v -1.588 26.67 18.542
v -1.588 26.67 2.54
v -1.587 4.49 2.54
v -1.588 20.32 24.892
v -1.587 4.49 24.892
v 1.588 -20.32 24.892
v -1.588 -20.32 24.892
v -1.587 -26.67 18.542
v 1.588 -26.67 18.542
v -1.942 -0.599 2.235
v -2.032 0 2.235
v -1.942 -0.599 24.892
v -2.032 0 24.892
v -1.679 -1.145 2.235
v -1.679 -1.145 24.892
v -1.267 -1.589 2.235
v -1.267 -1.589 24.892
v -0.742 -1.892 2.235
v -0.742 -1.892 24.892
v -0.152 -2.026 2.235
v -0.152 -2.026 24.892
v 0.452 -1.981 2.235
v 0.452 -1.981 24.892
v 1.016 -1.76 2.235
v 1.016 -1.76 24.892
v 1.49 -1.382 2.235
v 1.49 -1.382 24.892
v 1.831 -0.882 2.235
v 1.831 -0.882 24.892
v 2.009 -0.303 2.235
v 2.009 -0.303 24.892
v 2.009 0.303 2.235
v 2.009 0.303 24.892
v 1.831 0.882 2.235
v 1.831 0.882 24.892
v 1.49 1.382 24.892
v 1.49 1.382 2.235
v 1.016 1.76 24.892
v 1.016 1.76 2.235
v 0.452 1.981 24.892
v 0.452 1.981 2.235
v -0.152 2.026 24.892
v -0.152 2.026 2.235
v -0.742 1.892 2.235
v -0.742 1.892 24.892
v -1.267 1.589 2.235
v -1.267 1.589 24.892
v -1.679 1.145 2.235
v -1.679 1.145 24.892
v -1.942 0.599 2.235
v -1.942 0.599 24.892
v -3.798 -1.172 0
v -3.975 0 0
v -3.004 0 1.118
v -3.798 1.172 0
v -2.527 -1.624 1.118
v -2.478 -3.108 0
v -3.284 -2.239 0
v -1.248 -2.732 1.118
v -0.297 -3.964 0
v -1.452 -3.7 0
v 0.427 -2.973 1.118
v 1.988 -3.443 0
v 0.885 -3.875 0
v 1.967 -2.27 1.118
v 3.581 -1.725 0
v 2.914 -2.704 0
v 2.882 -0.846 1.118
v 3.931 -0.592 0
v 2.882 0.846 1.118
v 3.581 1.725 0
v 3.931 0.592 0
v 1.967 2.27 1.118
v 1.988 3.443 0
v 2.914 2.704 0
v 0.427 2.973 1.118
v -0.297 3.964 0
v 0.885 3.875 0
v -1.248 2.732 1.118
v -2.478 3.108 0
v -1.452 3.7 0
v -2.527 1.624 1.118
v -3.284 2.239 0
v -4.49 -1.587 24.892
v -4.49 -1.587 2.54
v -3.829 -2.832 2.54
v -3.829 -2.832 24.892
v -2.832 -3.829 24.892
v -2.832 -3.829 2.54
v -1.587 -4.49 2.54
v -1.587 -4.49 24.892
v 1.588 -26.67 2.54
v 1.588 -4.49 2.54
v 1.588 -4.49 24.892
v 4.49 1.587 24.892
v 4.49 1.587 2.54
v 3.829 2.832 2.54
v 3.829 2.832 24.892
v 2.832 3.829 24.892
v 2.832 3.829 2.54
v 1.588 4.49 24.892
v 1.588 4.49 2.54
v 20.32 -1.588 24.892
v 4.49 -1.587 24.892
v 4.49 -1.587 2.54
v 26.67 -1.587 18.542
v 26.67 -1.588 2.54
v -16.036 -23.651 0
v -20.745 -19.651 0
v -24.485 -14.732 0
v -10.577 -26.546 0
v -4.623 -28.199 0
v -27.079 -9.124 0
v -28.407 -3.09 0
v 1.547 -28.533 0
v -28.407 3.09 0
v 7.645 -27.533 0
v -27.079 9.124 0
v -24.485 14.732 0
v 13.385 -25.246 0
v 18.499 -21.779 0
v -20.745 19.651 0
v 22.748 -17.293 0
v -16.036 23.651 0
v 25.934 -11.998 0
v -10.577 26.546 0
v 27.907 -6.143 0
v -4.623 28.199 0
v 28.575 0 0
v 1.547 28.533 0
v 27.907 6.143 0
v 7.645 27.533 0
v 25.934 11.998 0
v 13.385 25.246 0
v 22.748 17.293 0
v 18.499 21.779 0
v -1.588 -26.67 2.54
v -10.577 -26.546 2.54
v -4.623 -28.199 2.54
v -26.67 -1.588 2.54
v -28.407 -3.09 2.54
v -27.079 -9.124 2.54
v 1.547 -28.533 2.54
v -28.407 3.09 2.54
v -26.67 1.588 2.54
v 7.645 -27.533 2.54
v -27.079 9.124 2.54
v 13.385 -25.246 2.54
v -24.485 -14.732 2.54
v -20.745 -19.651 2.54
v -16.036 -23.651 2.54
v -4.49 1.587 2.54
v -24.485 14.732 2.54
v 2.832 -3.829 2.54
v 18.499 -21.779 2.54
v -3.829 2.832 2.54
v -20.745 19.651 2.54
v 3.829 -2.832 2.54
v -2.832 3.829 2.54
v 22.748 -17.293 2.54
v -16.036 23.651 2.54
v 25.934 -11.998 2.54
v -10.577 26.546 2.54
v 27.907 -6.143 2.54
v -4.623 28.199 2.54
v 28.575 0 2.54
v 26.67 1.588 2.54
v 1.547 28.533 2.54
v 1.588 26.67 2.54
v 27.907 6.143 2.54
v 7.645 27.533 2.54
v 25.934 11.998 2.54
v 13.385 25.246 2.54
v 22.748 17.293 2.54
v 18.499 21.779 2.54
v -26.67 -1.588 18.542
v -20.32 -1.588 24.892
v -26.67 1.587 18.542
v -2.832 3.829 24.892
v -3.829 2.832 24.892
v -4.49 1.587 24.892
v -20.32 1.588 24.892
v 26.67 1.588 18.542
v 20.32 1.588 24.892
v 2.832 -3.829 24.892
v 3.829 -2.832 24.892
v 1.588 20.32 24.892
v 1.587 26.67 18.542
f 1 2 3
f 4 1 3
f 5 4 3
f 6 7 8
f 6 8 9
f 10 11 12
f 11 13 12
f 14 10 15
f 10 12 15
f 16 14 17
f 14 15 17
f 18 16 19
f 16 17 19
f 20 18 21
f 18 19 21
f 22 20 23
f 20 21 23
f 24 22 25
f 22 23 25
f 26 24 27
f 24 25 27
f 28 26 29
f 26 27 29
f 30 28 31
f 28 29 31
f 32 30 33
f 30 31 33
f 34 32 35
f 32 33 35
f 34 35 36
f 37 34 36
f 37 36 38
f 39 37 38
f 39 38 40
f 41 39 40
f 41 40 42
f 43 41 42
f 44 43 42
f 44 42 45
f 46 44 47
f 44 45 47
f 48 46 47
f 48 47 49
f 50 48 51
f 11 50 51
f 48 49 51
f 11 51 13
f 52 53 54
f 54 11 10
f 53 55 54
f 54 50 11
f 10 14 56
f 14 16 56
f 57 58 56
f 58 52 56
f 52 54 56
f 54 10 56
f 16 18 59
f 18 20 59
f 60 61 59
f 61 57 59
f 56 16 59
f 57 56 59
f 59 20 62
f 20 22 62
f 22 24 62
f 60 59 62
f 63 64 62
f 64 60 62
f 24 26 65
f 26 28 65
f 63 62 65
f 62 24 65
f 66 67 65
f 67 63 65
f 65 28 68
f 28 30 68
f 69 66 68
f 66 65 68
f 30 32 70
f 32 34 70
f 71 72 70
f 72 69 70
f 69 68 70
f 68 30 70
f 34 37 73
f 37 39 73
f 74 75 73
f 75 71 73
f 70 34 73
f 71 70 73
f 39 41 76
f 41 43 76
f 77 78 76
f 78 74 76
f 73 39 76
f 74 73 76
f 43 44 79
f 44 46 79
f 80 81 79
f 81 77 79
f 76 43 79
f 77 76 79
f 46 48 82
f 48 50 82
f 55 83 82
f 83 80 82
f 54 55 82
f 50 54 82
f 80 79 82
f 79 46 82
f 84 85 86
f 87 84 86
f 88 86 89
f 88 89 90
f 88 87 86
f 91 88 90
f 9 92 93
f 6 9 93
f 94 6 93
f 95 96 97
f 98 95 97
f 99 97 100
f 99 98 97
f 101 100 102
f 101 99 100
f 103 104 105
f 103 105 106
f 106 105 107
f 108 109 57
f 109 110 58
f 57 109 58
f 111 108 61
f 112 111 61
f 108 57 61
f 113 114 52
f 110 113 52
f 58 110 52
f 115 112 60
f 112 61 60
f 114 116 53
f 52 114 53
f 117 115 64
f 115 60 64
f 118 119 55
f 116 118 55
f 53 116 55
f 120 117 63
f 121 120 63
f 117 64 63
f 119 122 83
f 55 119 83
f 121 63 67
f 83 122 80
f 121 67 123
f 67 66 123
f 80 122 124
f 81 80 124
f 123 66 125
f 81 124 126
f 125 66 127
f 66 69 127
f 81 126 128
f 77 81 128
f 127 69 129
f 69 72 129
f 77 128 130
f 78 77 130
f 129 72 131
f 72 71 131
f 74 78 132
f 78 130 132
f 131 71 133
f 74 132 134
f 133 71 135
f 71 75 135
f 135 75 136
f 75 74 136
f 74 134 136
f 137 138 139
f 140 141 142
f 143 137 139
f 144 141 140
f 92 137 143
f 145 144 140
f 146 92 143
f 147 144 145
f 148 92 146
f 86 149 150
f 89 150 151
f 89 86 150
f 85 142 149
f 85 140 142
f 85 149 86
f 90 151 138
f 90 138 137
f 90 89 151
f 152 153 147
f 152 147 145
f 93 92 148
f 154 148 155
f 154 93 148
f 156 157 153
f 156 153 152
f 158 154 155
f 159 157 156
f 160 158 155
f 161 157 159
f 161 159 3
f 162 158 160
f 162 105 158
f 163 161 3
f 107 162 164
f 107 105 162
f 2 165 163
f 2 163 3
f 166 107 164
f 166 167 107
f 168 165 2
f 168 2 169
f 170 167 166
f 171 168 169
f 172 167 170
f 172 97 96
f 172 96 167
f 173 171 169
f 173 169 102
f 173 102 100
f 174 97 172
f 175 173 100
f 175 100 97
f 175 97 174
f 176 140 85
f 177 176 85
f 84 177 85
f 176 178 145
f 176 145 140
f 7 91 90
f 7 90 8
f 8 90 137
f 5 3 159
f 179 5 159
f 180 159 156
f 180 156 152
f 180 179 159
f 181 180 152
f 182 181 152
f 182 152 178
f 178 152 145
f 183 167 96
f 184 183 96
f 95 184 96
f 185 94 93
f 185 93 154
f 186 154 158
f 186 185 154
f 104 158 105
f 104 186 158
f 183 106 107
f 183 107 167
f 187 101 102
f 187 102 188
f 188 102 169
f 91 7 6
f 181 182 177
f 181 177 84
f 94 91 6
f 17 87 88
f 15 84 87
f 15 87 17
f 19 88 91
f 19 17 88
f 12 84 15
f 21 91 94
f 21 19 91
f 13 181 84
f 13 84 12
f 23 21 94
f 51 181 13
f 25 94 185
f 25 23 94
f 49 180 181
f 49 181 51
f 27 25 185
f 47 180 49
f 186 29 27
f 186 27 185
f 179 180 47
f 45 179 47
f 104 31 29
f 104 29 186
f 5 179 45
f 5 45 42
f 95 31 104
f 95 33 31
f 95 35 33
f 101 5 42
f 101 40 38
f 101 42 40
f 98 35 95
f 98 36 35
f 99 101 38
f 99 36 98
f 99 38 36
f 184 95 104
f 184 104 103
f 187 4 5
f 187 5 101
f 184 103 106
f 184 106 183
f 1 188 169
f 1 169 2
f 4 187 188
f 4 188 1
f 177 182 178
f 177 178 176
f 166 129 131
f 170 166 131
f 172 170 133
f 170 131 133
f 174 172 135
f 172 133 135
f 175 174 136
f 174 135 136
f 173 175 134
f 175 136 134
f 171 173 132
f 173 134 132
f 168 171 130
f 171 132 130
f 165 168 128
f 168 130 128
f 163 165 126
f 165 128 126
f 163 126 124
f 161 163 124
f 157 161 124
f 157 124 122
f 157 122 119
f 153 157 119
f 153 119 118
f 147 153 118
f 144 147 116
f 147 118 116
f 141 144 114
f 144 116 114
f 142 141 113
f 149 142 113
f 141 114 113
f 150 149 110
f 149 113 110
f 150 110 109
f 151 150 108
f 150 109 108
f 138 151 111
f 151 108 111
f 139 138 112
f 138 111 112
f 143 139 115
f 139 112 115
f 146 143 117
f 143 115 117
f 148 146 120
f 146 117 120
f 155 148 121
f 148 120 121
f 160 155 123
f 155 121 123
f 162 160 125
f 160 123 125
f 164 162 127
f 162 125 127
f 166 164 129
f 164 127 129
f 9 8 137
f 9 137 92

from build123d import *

# Parameters (mm, degrees)
F0_R           = 28.575
F1_DEPTH       = 2.54
F3_DEPTH       = 22.352
F4_SIZE        = 6.35
F5_R           = 4.7625
F6_DEPTH       = 22.352
F8_D           = 4.064
F8_CSINK_D     = 7.9502
F8_CSINK_ANGLE = 82


with BuildPart() as f1:
    # F0 (on Top) → F1 (new body)
    with BuildSketch(Plane.XY):
        Circle(F0_R)
    extrude(amount=F1_DEPTH)

    # F2 (on face) → F3 (join)
    with BuildSketch(Plane.XY.offset(2.54)):
        Polygon((26.67, -1.5875), (26.67, 1.5875), (1.5875, 1.5875), (1.5875, 26.67), (-1.5875, 26.67), (-1.5875, 1.5875), (-26.67, 1.5875), (-26.67, -1.5875), (-1.5875, -1.5875), (-1.5875, -26.67), (1.5875, -26.67), (1.5875, -1.5875), align=None)
    extrude(amount=F3_DEPTH)

    # F4
    f4_edges = [f1.edges().sort_by_distance(p)[0] for p in [
        (0, -26.67, 24.892),
        (26.67, 0, 24.892),
        (0, 26.67, 24.892),
        (-26.67, 0, 24.892),
    ]]
    chamfer(f4_edges, length=F4_SIZE)

    # F5 (on face) → F6 (join, through all)
    with BuildSketch(Plane.XY.offset(24.892)):
        Circle(F5_R)
    extrude(amount=-F6_DEPTH)

    # F8 (through all)
    with Locations(Plane(origin=(0, 0, 0), x_dir=(1, 0, 0), z_dir=(0, 0, -1))):
        with Locations((0, 0)):
            CounterSinkHole(F8_D / 2, F8_CSINK_D / 2, counter_sink_angle=F8_CSINK_ANGLE)


solid = f1.part
